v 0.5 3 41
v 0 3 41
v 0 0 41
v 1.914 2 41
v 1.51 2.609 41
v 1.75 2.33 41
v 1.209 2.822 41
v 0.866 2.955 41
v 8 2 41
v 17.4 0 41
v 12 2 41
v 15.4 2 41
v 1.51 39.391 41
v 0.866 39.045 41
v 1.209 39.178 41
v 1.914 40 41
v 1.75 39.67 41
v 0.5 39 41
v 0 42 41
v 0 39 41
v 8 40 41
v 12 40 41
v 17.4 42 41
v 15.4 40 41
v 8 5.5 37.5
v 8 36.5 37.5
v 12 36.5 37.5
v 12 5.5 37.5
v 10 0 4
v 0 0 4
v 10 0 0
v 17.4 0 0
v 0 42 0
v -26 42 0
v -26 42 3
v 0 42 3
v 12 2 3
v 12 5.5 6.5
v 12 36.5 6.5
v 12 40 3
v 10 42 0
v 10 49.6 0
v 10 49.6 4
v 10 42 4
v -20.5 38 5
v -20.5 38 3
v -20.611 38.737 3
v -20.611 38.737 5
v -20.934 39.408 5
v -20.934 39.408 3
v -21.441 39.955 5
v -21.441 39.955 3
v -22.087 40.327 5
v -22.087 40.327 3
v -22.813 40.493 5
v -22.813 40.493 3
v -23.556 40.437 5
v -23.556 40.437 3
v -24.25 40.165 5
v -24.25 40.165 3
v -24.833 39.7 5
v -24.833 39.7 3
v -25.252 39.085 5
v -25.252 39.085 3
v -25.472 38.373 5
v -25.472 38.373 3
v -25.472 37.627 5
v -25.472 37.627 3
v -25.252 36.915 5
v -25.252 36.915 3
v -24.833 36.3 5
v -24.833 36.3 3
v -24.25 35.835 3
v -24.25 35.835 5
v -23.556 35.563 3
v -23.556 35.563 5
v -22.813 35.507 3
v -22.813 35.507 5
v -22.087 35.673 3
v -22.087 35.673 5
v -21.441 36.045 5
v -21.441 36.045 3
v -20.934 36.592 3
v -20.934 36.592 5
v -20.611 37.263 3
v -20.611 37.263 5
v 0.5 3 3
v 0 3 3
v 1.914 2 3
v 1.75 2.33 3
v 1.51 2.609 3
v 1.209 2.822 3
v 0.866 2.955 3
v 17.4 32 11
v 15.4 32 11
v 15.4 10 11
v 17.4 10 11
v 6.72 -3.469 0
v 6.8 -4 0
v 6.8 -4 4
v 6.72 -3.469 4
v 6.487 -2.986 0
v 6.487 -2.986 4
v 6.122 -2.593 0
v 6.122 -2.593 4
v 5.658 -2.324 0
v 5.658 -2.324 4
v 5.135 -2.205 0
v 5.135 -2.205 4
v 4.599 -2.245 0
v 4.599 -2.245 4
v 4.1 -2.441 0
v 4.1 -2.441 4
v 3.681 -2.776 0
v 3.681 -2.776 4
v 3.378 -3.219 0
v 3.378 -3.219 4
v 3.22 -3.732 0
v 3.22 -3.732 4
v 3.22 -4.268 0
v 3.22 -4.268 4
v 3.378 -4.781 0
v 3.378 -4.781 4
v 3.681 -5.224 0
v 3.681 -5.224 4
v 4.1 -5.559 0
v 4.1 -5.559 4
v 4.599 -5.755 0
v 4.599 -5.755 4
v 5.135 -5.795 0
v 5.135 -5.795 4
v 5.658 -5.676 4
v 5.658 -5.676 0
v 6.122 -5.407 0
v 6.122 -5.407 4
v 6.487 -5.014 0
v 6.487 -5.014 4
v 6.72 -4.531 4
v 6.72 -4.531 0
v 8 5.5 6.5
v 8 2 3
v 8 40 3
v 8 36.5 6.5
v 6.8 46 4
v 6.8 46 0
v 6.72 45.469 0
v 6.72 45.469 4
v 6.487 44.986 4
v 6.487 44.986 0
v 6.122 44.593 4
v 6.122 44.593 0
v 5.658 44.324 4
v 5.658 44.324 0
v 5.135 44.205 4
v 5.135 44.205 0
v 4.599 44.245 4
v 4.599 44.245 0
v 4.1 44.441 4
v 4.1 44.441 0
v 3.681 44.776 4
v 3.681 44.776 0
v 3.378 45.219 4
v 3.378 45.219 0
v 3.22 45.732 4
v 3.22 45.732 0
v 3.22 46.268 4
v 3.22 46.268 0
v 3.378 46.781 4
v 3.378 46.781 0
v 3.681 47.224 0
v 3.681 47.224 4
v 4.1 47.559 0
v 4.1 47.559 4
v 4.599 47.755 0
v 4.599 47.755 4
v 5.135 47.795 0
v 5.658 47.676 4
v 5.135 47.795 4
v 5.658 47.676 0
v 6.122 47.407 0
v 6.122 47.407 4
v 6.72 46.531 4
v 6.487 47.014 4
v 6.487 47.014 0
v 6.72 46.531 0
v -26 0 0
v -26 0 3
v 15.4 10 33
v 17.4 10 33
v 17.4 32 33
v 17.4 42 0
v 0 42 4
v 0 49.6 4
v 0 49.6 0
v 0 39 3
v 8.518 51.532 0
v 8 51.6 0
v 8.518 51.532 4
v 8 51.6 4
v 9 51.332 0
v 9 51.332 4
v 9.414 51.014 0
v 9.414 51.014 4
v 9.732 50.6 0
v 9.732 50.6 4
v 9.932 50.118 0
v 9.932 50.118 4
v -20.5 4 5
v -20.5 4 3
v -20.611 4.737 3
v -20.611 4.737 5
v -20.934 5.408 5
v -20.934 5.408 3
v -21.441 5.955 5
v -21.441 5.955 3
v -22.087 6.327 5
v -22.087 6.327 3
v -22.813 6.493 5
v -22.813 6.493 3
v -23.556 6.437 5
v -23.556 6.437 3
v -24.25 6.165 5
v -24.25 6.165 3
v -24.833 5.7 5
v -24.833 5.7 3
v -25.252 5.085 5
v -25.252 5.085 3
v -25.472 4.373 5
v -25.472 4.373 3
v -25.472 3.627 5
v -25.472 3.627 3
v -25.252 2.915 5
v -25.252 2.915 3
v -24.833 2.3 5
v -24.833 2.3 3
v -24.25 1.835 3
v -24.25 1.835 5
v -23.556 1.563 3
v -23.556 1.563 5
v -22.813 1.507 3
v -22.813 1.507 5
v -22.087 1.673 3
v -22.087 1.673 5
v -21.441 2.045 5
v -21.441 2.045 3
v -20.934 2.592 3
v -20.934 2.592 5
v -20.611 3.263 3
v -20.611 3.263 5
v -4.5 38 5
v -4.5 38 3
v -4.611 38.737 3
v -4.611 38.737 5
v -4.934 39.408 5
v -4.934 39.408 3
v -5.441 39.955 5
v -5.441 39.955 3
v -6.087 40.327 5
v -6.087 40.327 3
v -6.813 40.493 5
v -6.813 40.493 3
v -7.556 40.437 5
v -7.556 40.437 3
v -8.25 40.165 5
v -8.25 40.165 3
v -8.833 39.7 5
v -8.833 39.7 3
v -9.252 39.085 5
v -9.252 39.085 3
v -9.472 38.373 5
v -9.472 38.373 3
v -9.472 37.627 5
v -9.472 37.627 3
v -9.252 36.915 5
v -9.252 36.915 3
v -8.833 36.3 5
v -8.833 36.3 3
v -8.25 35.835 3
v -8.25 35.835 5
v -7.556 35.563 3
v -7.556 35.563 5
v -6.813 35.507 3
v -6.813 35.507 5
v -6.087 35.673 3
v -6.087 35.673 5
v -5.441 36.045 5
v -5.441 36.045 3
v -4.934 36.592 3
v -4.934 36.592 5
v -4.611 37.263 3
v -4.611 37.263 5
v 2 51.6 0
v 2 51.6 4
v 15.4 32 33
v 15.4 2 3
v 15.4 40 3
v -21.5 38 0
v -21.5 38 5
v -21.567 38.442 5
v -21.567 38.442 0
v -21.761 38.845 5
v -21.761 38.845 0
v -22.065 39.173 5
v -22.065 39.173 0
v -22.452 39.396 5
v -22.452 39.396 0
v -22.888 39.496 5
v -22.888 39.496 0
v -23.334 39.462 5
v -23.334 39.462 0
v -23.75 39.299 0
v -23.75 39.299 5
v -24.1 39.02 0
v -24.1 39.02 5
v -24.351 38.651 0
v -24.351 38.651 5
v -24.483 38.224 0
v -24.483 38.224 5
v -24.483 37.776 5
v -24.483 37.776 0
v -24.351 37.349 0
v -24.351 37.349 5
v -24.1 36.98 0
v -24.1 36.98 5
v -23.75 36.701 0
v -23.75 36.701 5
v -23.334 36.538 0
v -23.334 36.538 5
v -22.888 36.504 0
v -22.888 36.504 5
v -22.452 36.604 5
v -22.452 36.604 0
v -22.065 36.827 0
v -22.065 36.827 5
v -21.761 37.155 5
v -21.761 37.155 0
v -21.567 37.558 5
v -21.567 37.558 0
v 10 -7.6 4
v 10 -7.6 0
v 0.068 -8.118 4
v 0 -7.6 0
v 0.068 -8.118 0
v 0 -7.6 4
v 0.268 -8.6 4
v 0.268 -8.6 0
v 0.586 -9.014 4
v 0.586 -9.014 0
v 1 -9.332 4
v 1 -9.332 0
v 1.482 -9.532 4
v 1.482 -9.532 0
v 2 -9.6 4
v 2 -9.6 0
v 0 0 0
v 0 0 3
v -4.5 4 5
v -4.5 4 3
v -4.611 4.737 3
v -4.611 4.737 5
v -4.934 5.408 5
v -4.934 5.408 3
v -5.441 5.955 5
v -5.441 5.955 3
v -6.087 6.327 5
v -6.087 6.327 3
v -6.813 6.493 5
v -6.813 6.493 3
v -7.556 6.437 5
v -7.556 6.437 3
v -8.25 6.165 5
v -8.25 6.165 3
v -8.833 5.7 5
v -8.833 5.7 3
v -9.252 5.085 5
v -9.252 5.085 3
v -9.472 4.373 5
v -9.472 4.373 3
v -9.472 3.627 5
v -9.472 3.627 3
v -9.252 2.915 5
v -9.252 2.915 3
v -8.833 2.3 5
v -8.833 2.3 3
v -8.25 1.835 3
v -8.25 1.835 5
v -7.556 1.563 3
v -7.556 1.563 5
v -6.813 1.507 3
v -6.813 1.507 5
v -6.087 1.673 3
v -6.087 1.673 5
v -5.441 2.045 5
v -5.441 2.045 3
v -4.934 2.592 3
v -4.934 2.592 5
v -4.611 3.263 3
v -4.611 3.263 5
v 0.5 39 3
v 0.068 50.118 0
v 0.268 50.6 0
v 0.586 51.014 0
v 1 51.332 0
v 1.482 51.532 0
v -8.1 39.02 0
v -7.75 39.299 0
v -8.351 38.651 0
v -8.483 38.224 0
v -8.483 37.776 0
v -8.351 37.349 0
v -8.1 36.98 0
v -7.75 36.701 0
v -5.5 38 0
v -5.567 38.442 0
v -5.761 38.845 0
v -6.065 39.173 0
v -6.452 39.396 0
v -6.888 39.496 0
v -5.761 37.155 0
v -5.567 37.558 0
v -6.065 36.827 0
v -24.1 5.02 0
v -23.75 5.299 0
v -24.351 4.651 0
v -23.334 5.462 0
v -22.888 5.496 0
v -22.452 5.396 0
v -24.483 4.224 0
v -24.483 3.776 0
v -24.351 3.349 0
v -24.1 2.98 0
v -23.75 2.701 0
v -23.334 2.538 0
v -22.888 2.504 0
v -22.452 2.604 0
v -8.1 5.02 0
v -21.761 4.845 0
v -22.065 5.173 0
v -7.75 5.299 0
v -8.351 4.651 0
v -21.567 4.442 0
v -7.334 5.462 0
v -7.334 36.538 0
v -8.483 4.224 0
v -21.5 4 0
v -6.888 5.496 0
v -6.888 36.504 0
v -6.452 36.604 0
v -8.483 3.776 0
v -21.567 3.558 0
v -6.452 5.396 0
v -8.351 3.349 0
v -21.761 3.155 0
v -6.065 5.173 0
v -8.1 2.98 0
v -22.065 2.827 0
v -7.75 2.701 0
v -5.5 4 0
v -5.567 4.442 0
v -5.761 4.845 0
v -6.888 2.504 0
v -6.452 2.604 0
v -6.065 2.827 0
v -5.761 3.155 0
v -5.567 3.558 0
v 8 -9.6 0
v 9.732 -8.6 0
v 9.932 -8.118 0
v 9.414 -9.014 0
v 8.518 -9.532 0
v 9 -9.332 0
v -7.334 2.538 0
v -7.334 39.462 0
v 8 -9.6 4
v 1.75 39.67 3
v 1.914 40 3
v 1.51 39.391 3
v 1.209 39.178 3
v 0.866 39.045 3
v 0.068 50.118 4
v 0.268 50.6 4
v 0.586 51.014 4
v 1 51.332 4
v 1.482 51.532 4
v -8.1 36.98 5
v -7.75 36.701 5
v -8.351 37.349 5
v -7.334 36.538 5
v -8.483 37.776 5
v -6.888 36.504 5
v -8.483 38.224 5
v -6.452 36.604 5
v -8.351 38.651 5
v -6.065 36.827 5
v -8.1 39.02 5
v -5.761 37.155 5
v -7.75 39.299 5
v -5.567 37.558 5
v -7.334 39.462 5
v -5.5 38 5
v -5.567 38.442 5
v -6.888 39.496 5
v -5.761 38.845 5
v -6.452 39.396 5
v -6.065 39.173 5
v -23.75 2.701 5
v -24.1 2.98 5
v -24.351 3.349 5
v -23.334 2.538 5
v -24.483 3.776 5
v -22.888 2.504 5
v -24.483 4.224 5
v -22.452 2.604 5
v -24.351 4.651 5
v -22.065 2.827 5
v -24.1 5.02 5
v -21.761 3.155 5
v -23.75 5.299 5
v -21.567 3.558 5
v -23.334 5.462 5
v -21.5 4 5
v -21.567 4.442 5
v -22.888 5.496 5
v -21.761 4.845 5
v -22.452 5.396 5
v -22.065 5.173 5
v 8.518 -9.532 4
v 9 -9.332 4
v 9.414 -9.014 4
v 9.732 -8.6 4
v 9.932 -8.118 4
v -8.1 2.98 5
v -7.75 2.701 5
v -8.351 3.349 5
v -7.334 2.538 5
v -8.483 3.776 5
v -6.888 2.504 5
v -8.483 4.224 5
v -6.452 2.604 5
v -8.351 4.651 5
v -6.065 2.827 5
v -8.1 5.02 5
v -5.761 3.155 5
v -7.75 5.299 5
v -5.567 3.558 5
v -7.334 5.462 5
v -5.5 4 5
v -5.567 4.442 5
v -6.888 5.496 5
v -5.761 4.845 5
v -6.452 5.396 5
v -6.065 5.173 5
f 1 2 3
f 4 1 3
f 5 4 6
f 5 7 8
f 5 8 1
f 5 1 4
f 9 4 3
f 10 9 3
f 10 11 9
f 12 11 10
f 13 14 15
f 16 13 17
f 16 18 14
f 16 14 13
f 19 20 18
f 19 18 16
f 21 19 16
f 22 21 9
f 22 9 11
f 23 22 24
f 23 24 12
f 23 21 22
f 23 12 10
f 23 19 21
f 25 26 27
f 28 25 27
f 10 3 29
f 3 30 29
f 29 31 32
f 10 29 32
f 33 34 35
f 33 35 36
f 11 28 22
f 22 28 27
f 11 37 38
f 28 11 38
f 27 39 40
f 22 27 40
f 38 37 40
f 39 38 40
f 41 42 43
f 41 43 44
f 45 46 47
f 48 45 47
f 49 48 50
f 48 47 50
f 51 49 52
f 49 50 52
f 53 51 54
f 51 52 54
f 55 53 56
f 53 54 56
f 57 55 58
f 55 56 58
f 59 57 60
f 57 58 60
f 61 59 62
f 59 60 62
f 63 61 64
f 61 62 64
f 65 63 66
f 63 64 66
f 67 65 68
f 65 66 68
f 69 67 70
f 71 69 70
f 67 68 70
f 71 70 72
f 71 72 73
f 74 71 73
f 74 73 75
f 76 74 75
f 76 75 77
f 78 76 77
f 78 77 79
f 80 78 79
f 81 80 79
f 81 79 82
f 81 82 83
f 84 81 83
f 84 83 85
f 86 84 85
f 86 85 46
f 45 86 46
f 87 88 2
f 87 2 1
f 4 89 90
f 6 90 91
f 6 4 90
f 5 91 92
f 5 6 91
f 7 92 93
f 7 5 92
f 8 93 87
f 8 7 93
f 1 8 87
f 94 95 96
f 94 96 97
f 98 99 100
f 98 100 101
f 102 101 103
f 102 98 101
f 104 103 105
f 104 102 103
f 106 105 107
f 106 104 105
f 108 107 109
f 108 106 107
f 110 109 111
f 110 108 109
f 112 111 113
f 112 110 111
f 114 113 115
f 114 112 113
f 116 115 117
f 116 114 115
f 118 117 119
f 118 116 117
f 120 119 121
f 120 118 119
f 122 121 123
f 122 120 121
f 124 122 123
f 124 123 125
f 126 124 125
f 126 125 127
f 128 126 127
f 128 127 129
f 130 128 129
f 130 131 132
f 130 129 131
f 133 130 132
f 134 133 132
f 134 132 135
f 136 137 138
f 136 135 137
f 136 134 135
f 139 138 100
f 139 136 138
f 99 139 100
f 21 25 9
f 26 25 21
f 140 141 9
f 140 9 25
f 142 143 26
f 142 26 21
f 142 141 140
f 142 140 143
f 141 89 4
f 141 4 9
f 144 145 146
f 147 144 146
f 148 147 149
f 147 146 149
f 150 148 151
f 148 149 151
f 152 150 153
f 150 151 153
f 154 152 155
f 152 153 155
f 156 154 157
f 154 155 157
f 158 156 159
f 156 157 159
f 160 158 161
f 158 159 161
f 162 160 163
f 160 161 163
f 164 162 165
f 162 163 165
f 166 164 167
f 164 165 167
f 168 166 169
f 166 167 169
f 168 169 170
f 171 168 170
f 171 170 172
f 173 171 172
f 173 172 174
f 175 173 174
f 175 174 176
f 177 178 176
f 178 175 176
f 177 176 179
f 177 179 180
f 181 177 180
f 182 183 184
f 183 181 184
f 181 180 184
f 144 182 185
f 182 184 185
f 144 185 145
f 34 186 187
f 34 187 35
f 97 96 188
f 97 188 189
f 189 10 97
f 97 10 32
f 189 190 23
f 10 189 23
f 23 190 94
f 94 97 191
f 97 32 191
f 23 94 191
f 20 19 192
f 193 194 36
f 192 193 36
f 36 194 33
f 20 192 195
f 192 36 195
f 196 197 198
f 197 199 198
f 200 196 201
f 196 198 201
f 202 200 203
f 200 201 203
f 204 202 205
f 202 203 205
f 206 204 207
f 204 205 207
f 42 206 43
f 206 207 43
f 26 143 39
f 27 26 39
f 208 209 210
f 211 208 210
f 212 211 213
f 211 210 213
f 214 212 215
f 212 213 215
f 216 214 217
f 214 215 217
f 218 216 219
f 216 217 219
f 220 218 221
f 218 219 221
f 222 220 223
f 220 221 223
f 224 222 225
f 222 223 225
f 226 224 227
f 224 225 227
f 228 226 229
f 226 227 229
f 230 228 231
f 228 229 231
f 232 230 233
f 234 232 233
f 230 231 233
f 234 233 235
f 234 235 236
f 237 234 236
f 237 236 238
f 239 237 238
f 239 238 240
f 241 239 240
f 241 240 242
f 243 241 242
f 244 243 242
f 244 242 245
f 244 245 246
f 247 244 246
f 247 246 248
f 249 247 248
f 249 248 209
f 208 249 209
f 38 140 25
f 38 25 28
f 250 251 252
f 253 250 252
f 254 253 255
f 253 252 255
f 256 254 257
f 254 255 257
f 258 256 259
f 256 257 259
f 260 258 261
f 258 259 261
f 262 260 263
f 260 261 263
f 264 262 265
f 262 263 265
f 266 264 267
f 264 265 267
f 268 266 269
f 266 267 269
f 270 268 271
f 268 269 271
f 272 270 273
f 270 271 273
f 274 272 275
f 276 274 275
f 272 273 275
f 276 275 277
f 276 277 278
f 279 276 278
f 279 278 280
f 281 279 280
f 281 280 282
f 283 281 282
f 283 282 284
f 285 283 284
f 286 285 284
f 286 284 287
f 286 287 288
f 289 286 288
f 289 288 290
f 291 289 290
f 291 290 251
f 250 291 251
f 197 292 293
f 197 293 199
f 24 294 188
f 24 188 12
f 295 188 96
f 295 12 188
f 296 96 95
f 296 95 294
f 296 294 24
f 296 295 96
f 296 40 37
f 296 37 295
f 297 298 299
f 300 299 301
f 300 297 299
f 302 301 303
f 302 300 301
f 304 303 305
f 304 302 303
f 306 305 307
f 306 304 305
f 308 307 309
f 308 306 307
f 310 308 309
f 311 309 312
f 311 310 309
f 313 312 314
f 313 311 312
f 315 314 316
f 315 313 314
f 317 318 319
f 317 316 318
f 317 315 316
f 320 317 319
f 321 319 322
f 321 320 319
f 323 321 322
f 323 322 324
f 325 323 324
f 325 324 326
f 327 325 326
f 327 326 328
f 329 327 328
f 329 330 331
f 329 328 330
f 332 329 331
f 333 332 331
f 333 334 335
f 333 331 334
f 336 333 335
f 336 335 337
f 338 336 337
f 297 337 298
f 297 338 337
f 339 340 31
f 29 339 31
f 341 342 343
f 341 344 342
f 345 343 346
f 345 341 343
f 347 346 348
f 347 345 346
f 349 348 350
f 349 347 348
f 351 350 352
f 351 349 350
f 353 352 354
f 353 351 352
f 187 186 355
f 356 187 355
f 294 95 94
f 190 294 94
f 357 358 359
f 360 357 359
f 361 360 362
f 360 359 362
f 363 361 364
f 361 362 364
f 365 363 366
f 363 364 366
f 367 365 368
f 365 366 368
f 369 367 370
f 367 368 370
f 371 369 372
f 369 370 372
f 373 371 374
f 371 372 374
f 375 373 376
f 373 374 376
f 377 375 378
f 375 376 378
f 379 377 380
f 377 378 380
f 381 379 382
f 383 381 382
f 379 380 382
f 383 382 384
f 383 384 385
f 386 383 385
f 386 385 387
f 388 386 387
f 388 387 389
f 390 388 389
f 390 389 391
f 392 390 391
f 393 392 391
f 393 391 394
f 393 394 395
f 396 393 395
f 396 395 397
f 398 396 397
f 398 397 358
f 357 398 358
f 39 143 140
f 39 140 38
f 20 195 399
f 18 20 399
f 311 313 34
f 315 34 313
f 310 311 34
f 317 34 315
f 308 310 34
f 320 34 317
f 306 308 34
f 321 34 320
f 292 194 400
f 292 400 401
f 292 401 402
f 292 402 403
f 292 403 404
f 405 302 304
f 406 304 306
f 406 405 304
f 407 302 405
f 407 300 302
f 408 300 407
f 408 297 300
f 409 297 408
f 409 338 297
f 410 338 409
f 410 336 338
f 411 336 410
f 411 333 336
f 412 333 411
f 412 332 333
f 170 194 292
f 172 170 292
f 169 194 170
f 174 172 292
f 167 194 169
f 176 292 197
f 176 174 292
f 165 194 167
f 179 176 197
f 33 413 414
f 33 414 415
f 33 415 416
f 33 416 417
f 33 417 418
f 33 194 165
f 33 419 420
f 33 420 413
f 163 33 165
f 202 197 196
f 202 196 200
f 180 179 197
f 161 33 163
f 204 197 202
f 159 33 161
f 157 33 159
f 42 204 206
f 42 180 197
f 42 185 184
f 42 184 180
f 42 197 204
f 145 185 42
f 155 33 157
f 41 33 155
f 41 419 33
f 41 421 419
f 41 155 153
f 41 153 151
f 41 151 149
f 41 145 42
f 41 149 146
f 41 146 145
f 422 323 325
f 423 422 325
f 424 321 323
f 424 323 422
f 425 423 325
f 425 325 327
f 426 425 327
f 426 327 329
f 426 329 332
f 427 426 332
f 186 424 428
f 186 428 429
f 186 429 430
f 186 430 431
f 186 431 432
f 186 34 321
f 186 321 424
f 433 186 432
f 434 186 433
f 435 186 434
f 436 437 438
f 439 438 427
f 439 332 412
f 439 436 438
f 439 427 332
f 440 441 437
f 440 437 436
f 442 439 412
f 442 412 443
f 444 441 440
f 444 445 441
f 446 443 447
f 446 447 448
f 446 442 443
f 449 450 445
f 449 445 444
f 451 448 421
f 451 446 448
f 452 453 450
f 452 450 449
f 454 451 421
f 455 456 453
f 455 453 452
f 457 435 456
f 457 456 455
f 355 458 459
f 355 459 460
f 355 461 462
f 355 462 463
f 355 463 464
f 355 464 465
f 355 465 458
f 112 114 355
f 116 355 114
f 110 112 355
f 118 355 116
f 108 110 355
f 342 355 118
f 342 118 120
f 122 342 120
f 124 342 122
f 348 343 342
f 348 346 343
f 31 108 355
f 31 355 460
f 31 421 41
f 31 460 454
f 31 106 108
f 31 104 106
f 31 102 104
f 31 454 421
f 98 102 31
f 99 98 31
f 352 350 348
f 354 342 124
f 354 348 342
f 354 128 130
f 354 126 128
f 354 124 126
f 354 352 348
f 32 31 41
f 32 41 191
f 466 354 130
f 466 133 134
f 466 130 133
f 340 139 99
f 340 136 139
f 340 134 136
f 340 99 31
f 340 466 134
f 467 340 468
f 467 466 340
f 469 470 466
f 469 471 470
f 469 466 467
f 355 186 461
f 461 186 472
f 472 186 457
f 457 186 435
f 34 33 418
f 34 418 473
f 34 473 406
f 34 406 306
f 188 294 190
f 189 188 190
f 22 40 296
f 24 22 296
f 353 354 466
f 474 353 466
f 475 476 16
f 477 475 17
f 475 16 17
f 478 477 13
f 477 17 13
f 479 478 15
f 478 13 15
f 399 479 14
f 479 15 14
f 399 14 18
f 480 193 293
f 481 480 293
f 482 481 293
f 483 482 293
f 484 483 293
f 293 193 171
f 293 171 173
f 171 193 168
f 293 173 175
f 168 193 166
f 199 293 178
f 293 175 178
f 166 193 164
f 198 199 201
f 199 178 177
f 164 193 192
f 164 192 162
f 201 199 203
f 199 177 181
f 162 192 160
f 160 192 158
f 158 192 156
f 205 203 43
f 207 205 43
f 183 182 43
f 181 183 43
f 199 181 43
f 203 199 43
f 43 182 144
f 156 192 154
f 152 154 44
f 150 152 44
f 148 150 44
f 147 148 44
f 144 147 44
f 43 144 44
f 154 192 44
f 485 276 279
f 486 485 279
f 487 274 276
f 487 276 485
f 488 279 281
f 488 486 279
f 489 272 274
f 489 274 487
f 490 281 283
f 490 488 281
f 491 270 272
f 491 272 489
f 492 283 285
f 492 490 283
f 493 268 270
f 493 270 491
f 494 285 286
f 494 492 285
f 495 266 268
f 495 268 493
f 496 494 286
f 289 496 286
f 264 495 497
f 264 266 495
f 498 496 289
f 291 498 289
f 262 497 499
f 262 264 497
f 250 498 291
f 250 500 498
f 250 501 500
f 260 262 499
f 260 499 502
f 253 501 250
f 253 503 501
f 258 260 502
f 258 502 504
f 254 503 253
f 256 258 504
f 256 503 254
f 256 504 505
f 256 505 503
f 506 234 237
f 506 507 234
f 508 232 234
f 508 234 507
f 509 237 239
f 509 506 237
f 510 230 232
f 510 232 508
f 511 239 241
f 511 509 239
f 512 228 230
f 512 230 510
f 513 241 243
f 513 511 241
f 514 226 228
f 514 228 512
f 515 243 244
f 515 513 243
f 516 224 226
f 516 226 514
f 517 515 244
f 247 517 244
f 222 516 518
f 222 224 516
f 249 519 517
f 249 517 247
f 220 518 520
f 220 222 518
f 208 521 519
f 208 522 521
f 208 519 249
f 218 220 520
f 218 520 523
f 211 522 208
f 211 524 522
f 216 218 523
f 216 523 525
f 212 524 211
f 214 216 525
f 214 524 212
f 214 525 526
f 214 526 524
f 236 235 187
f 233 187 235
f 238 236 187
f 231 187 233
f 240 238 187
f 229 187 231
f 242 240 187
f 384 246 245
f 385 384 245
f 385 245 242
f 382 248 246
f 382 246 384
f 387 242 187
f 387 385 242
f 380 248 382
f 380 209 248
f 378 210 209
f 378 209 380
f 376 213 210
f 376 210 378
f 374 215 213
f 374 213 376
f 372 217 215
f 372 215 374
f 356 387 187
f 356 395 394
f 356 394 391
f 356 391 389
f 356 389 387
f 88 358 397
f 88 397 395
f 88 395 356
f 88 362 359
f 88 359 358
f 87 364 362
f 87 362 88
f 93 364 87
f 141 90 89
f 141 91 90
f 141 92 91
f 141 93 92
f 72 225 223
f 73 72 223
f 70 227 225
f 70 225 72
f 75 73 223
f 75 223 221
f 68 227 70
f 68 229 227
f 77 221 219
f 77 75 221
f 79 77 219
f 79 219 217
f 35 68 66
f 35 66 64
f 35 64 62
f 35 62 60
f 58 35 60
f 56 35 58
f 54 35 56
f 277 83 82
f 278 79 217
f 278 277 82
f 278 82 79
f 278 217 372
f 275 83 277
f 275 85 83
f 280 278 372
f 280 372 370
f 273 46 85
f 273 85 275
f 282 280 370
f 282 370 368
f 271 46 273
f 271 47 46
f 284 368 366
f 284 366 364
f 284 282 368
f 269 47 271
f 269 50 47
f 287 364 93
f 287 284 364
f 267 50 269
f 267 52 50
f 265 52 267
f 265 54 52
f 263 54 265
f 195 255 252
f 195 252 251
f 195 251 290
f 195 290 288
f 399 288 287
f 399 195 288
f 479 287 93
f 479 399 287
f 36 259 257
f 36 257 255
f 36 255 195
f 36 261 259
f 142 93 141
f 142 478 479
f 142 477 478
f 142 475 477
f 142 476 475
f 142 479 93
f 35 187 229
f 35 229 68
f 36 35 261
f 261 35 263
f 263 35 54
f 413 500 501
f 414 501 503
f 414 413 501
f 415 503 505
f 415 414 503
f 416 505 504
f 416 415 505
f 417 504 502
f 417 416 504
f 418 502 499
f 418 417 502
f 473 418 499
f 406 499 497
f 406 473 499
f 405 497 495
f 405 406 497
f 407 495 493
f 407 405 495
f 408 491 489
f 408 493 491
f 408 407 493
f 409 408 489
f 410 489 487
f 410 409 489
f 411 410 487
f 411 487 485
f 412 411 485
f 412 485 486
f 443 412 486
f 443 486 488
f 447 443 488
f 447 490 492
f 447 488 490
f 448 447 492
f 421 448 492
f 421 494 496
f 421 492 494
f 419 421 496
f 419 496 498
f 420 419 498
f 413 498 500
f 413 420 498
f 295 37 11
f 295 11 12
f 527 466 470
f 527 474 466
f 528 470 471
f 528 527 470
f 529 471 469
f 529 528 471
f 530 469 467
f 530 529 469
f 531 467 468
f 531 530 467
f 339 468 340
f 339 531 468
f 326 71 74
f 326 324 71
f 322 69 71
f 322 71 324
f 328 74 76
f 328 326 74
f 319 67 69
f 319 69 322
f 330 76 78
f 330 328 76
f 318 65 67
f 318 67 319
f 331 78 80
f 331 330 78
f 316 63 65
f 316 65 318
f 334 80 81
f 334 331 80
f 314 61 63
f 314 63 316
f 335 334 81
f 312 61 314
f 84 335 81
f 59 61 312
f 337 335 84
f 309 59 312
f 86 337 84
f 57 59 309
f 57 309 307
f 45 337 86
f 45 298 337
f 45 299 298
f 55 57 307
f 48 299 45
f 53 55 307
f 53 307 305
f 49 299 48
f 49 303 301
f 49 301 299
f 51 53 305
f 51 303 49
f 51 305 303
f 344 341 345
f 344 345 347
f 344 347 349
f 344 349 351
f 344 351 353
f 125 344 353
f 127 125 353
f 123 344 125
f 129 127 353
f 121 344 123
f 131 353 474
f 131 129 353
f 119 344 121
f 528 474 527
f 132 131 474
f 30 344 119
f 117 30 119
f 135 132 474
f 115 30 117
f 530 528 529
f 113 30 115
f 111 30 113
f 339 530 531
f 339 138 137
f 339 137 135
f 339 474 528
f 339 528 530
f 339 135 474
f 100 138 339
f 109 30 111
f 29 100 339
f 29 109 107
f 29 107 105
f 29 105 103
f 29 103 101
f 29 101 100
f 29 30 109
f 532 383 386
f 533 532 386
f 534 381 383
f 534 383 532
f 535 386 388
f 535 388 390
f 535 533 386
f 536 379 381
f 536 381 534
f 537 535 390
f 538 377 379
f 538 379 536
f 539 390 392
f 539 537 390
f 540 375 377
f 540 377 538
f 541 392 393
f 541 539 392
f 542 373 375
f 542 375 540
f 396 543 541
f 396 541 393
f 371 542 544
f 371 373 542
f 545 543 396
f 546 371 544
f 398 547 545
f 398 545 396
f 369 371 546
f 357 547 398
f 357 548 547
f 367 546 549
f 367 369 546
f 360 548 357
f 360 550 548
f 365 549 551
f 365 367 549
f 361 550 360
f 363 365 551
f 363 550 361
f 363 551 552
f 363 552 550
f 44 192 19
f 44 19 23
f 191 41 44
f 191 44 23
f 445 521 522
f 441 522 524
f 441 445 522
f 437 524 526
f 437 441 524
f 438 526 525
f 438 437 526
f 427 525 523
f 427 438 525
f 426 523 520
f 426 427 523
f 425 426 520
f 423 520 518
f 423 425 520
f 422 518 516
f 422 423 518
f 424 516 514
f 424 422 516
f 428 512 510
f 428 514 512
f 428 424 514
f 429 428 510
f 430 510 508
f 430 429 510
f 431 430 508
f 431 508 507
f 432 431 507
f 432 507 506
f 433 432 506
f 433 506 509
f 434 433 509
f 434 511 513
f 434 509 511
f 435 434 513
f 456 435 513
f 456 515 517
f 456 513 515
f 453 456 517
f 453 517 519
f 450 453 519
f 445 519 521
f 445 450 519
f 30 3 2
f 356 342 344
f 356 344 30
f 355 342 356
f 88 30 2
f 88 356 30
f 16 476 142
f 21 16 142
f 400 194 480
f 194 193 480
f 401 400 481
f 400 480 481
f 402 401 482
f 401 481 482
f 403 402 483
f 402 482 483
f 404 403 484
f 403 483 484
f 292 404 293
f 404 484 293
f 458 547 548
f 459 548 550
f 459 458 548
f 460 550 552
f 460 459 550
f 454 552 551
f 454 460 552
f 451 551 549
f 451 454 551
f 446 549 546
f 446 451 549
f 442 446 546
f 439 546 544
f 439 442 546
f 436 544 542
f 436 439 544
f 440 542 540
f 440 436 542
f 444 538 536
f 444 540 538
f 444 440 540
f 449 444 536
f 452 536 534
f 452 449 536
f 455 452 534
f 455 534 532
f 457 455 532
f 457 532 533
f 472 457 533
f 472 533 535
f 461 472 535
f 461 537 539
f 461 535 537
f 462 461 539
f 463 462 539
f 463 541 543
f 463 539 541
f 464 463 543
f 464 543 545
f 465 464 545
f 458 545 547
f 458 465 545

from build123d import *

# Parameters (mm, degrees)
CYLINDER_R        = 1.5
CYLINDER_DEPTH    = 20
ARRAY_X_COUNT     = 2
ARRAY_X_PITCH     = 16
ARRAY_Y_COUNT     = 2
ARRAY_Y_PITCH     = 34
CYLINDER001_R     = 1.8
CYLINDER001_DEPTH = 10
BOX005_W          = 2
BOX005_H          = 3
BOX005_DEPTH      = 41
FILLET_R          = 1.5
BOX004_W          = 10
BOX004_H          = 9.6
BOX004_DEPTH      = 4
FILLET001_R       = 2
BOX001_W          = 17.4
BOX001_H          = 2
BOX001_DEPTH      = 41
BOX_W             = 41.4
BOX_H             = 42
BOX_DEPTH         = 3
BOX003_W          = 4
BOX003_H          = 31
BOX003_DEPTH      = 31
BOX002_W          = 4
BOX002_H          = 42
BOX002_DEPTH      = 41
BOX007_W          = 2
BOX007_H          = 22
BOX007_DEPTH      = 22
BOX006_W          = 2
BOX006_H          = 42
BOX006_DEPTH      = 41
CYLINDER002_R     = 2.5
CYLINDER002_DEPTH = 5
ARRAY001_X_COUNT  = 2
ARRAY001_X_PITCH  = 16
ARRAY001_Y_COUNT  = 2
ARRAY001_Y_PITCH  = 34


with BuildPart() as stepup_bolt_hole_array:
    # Cylinder → Cylinder (new body)
    with BuildSketch(Plane(origin=(-23, 4, 0), x_dir=(1, 0, 0), z_dir=(0, 0, 1))):
        Circle(CYLINDER_R)
    extrude(amount=CYLINDER_DEPTH)

    # Array X: stepup bolt hole array ×2


with BuildPart() as stepup_bolt_hole_array_1:
    add(stepup_bolt_hole_array.part)
    with Locations(*[(i * ARRAY_X_PITCH, 0, 0) for i in range(1, ARRAY_X_COUNT)]):
        add(stepup_bolt_hole_array.part)

    # Array Y: stepup bolt hole array ×2


with BuildPart() as stepup_bolt_hole_array_2:
    add(stepup_bolt_hole_array_1.part)
    with Locations(*[(0, i * ARRAY_Y_PITCH, 0) for i in range(1, ARRAY_Y_COUNT)]):
        add(stepup_bolt_hole_array_1.part)


with BuildPart() as bolt_hole:
    # Cylinder001 → Cylinder001 (new body)
    with BuildSketch(Plane(origin=(5, -4, -3), x_dir=(1, 0, 0), z_dir=(0, 0, 1))):
        Circle(CYLINDER001_R)
    extrude(amount=CYLINDER001_DEPTH)


with BuildPart() as side_locker_fillet:
    # Box005 → Box005 (new body)
    with BuildSketch(Plane.XY):
        with Locations((1, 1.5)):
            Rectangle(BOX005_W, BOX005_H)
    extrude(amount=BOX005_DEPTH)

    # Fillet
    fillet_edges = [side_locker_fillet.edges().sort_by_distance(p)[0] for p in [
        (2, 3, 20.5),
    ]]
    fillet(fillet_edges, radius=FILLET_R)


with BuildPart() as bolt_hole_cube_fillet:
    # Box004 → Box004 (new body)
    with BuildSketch(Plane(origin=(0, -9.6, 0), x_dir=(1, 0, 0), z_dir=(0, 0, 1))):
        with Locations((5, 4.8)):
            Rectangle(BOX004_W, BOX004_H)
    extrude(amount=BOX004_DEPTH)

    # Fillet001
    fillet001_edges = [bolt_hole_cube_fillet.edges().sort_by_distance(p)[0] for p in [
        (0, -9.6, 2),
        (10, -9.6, 2),
    ]]
    fillet(fillet001_edges, radius=FILLET001_R)


with BuildPart() as side_cut:
    # Box001 → Box001 (new body)
    with BuildSketch(Plane.XY):
        with Locations((8.7, 1)):
            Rectangle(BOX001_W, BOX001_H)
    extrude(amount=BOX001_DEPTH)

    # Fusion: union side locker fillet, bolt hole cube fillet
    add(side_locker_fillet.part)
    add(bolt_hole_cube_fillet.part)

    # Cut001: cut bolt hole
    add(bolt_hole.part, mode=Mode.SUBTRACT)


with BuildPart() as bottom_cube:
    # Box → Box (new body)
    with BuildSketch(Plane(origin=(-26, 0, 0), x_dir=(1, 0, 0), z_dir=(0, 0, 1))):
        with Locations((20.7, 21)):
            Rectangle(BOX_W, BOX_H)
    extrude(amount=BOX_DEPTH)


with BuildPart() as part_mirroring:
    # Part__Mirroring: instance of side cut
    add(side_cut.part.mirror(Plane(origin=(0, 21, 0), x_dir=(1, 0, 0), z_dir=(0, 1, 0))))


with BuildPart() as light_wall_hole_cube:
    # Box003 → Box003 (new body)
    with BuildSketch(Plane(origin=(8, 5.5, 6.5), x_dir=(1, 0, 0), z_dir=(0, 0, 1))):
        with Locations((2, 15.5)):
            Rectangle(BOX003_W, BOX003_H)
    extrude(amount=BOX003_DEPTH)


with BuildPart() as light_wall:
    # Box002 → Box002 (new body)
    with BuildSketch(Plane(origin=(8, 0, 0), x_dir=(1, 0, 0), z_dir=(0, 0, 1))):
        with Locations((2, 21)):
            Rectangle(BOX002_W, BOX002_H)
    extrude(amount=BOX002_DEPTH)

    # Cut: cut light wall hole cube
    add(light_wall_hole_cube.part, mode=Mode.SUBTRACT)


with BuildPart() as filter_wall_hole_cube:
    # Box007 → Box007 (new body)
    with BuildSketch(Plane(origin=(8, 10, 11), x_dir=(1, 0, 0), z_dir=(0, 0, 1))):
        with Locations((1, 11)):
            Rectangle(BOX007_W, BOX007_H)
    extrude(amount=BOX007_DEPTH)


with BuildPart() as filter_wall:
    # Box006 → Box006 (new body)
    with BuildSketch(Plane(origin=(8, 0, 0), x_dir=(1, 0, 0), z_dir=(0, 0, 1))):
        with Locations((1, 21)):
            Rectangle(BOX006_W, BOX006_H)
    extrude(amount=BOX006_DEPTH)

    # Cut003: cut filter wall hole cube
    add(filter_wall_hole_cube.part, mode=Mode.SUBTRACT)


with BuildPart() as filter_wall_1:
    # Cut003 placement: moved
    add(filter_wall.part.moved(Location((7.4, 0, 0))))


with BuildPart() as lighter_holder_cut:
    # Cylinder002 → Cylinder002 (new body)
    with BuildSketch(Plane(origin=(-23, 4, 0), x_dir=(1, 0, 0), z_dir=(0, 0, 1))):
        Circle(CYLINDER002_R)
    extrude(amount=CYLINDER002_DEPTH)

    # Array001 X: lighter holder cut ×2


with BuildPart() as lighter_holder_cut_1:
    add(lighter_holder_cut.part)
    with Locations(*[(i * ARRAY001_X_PITCH, 0, 0) for i in range(1, ARRAY001_X_COUNT)]):
        add(lighter_holder_cut.part)

    # Array001 Y: lighter holder cut ×2


with BuildPart() as lighter_holder_cut_2:
    add(lighter_holder_cut_1.part)
    with Locations(*[(0, i * ARRAY001_Y_PITCH, 0) for i in range(1, ARRAY001_Y_COUNT)]):
        add(lighter_holder_cut_1.part)

    # Fusion001: union side cut, bottom cube, Part__Mirroring, light wall, filter wall
    add(side_cut.part)
    add(bottom_cube.part)
    add(part_mirroring.part)
    add(light_wall.part)
    add(filter_wall_1.part)

    # Cut002: cut stepup bolt hole array
    add(stepup_bolt_hole_array_2.part, mode=Mode.SUBTRACT)


solid = lighter_holder_cut_2.part
